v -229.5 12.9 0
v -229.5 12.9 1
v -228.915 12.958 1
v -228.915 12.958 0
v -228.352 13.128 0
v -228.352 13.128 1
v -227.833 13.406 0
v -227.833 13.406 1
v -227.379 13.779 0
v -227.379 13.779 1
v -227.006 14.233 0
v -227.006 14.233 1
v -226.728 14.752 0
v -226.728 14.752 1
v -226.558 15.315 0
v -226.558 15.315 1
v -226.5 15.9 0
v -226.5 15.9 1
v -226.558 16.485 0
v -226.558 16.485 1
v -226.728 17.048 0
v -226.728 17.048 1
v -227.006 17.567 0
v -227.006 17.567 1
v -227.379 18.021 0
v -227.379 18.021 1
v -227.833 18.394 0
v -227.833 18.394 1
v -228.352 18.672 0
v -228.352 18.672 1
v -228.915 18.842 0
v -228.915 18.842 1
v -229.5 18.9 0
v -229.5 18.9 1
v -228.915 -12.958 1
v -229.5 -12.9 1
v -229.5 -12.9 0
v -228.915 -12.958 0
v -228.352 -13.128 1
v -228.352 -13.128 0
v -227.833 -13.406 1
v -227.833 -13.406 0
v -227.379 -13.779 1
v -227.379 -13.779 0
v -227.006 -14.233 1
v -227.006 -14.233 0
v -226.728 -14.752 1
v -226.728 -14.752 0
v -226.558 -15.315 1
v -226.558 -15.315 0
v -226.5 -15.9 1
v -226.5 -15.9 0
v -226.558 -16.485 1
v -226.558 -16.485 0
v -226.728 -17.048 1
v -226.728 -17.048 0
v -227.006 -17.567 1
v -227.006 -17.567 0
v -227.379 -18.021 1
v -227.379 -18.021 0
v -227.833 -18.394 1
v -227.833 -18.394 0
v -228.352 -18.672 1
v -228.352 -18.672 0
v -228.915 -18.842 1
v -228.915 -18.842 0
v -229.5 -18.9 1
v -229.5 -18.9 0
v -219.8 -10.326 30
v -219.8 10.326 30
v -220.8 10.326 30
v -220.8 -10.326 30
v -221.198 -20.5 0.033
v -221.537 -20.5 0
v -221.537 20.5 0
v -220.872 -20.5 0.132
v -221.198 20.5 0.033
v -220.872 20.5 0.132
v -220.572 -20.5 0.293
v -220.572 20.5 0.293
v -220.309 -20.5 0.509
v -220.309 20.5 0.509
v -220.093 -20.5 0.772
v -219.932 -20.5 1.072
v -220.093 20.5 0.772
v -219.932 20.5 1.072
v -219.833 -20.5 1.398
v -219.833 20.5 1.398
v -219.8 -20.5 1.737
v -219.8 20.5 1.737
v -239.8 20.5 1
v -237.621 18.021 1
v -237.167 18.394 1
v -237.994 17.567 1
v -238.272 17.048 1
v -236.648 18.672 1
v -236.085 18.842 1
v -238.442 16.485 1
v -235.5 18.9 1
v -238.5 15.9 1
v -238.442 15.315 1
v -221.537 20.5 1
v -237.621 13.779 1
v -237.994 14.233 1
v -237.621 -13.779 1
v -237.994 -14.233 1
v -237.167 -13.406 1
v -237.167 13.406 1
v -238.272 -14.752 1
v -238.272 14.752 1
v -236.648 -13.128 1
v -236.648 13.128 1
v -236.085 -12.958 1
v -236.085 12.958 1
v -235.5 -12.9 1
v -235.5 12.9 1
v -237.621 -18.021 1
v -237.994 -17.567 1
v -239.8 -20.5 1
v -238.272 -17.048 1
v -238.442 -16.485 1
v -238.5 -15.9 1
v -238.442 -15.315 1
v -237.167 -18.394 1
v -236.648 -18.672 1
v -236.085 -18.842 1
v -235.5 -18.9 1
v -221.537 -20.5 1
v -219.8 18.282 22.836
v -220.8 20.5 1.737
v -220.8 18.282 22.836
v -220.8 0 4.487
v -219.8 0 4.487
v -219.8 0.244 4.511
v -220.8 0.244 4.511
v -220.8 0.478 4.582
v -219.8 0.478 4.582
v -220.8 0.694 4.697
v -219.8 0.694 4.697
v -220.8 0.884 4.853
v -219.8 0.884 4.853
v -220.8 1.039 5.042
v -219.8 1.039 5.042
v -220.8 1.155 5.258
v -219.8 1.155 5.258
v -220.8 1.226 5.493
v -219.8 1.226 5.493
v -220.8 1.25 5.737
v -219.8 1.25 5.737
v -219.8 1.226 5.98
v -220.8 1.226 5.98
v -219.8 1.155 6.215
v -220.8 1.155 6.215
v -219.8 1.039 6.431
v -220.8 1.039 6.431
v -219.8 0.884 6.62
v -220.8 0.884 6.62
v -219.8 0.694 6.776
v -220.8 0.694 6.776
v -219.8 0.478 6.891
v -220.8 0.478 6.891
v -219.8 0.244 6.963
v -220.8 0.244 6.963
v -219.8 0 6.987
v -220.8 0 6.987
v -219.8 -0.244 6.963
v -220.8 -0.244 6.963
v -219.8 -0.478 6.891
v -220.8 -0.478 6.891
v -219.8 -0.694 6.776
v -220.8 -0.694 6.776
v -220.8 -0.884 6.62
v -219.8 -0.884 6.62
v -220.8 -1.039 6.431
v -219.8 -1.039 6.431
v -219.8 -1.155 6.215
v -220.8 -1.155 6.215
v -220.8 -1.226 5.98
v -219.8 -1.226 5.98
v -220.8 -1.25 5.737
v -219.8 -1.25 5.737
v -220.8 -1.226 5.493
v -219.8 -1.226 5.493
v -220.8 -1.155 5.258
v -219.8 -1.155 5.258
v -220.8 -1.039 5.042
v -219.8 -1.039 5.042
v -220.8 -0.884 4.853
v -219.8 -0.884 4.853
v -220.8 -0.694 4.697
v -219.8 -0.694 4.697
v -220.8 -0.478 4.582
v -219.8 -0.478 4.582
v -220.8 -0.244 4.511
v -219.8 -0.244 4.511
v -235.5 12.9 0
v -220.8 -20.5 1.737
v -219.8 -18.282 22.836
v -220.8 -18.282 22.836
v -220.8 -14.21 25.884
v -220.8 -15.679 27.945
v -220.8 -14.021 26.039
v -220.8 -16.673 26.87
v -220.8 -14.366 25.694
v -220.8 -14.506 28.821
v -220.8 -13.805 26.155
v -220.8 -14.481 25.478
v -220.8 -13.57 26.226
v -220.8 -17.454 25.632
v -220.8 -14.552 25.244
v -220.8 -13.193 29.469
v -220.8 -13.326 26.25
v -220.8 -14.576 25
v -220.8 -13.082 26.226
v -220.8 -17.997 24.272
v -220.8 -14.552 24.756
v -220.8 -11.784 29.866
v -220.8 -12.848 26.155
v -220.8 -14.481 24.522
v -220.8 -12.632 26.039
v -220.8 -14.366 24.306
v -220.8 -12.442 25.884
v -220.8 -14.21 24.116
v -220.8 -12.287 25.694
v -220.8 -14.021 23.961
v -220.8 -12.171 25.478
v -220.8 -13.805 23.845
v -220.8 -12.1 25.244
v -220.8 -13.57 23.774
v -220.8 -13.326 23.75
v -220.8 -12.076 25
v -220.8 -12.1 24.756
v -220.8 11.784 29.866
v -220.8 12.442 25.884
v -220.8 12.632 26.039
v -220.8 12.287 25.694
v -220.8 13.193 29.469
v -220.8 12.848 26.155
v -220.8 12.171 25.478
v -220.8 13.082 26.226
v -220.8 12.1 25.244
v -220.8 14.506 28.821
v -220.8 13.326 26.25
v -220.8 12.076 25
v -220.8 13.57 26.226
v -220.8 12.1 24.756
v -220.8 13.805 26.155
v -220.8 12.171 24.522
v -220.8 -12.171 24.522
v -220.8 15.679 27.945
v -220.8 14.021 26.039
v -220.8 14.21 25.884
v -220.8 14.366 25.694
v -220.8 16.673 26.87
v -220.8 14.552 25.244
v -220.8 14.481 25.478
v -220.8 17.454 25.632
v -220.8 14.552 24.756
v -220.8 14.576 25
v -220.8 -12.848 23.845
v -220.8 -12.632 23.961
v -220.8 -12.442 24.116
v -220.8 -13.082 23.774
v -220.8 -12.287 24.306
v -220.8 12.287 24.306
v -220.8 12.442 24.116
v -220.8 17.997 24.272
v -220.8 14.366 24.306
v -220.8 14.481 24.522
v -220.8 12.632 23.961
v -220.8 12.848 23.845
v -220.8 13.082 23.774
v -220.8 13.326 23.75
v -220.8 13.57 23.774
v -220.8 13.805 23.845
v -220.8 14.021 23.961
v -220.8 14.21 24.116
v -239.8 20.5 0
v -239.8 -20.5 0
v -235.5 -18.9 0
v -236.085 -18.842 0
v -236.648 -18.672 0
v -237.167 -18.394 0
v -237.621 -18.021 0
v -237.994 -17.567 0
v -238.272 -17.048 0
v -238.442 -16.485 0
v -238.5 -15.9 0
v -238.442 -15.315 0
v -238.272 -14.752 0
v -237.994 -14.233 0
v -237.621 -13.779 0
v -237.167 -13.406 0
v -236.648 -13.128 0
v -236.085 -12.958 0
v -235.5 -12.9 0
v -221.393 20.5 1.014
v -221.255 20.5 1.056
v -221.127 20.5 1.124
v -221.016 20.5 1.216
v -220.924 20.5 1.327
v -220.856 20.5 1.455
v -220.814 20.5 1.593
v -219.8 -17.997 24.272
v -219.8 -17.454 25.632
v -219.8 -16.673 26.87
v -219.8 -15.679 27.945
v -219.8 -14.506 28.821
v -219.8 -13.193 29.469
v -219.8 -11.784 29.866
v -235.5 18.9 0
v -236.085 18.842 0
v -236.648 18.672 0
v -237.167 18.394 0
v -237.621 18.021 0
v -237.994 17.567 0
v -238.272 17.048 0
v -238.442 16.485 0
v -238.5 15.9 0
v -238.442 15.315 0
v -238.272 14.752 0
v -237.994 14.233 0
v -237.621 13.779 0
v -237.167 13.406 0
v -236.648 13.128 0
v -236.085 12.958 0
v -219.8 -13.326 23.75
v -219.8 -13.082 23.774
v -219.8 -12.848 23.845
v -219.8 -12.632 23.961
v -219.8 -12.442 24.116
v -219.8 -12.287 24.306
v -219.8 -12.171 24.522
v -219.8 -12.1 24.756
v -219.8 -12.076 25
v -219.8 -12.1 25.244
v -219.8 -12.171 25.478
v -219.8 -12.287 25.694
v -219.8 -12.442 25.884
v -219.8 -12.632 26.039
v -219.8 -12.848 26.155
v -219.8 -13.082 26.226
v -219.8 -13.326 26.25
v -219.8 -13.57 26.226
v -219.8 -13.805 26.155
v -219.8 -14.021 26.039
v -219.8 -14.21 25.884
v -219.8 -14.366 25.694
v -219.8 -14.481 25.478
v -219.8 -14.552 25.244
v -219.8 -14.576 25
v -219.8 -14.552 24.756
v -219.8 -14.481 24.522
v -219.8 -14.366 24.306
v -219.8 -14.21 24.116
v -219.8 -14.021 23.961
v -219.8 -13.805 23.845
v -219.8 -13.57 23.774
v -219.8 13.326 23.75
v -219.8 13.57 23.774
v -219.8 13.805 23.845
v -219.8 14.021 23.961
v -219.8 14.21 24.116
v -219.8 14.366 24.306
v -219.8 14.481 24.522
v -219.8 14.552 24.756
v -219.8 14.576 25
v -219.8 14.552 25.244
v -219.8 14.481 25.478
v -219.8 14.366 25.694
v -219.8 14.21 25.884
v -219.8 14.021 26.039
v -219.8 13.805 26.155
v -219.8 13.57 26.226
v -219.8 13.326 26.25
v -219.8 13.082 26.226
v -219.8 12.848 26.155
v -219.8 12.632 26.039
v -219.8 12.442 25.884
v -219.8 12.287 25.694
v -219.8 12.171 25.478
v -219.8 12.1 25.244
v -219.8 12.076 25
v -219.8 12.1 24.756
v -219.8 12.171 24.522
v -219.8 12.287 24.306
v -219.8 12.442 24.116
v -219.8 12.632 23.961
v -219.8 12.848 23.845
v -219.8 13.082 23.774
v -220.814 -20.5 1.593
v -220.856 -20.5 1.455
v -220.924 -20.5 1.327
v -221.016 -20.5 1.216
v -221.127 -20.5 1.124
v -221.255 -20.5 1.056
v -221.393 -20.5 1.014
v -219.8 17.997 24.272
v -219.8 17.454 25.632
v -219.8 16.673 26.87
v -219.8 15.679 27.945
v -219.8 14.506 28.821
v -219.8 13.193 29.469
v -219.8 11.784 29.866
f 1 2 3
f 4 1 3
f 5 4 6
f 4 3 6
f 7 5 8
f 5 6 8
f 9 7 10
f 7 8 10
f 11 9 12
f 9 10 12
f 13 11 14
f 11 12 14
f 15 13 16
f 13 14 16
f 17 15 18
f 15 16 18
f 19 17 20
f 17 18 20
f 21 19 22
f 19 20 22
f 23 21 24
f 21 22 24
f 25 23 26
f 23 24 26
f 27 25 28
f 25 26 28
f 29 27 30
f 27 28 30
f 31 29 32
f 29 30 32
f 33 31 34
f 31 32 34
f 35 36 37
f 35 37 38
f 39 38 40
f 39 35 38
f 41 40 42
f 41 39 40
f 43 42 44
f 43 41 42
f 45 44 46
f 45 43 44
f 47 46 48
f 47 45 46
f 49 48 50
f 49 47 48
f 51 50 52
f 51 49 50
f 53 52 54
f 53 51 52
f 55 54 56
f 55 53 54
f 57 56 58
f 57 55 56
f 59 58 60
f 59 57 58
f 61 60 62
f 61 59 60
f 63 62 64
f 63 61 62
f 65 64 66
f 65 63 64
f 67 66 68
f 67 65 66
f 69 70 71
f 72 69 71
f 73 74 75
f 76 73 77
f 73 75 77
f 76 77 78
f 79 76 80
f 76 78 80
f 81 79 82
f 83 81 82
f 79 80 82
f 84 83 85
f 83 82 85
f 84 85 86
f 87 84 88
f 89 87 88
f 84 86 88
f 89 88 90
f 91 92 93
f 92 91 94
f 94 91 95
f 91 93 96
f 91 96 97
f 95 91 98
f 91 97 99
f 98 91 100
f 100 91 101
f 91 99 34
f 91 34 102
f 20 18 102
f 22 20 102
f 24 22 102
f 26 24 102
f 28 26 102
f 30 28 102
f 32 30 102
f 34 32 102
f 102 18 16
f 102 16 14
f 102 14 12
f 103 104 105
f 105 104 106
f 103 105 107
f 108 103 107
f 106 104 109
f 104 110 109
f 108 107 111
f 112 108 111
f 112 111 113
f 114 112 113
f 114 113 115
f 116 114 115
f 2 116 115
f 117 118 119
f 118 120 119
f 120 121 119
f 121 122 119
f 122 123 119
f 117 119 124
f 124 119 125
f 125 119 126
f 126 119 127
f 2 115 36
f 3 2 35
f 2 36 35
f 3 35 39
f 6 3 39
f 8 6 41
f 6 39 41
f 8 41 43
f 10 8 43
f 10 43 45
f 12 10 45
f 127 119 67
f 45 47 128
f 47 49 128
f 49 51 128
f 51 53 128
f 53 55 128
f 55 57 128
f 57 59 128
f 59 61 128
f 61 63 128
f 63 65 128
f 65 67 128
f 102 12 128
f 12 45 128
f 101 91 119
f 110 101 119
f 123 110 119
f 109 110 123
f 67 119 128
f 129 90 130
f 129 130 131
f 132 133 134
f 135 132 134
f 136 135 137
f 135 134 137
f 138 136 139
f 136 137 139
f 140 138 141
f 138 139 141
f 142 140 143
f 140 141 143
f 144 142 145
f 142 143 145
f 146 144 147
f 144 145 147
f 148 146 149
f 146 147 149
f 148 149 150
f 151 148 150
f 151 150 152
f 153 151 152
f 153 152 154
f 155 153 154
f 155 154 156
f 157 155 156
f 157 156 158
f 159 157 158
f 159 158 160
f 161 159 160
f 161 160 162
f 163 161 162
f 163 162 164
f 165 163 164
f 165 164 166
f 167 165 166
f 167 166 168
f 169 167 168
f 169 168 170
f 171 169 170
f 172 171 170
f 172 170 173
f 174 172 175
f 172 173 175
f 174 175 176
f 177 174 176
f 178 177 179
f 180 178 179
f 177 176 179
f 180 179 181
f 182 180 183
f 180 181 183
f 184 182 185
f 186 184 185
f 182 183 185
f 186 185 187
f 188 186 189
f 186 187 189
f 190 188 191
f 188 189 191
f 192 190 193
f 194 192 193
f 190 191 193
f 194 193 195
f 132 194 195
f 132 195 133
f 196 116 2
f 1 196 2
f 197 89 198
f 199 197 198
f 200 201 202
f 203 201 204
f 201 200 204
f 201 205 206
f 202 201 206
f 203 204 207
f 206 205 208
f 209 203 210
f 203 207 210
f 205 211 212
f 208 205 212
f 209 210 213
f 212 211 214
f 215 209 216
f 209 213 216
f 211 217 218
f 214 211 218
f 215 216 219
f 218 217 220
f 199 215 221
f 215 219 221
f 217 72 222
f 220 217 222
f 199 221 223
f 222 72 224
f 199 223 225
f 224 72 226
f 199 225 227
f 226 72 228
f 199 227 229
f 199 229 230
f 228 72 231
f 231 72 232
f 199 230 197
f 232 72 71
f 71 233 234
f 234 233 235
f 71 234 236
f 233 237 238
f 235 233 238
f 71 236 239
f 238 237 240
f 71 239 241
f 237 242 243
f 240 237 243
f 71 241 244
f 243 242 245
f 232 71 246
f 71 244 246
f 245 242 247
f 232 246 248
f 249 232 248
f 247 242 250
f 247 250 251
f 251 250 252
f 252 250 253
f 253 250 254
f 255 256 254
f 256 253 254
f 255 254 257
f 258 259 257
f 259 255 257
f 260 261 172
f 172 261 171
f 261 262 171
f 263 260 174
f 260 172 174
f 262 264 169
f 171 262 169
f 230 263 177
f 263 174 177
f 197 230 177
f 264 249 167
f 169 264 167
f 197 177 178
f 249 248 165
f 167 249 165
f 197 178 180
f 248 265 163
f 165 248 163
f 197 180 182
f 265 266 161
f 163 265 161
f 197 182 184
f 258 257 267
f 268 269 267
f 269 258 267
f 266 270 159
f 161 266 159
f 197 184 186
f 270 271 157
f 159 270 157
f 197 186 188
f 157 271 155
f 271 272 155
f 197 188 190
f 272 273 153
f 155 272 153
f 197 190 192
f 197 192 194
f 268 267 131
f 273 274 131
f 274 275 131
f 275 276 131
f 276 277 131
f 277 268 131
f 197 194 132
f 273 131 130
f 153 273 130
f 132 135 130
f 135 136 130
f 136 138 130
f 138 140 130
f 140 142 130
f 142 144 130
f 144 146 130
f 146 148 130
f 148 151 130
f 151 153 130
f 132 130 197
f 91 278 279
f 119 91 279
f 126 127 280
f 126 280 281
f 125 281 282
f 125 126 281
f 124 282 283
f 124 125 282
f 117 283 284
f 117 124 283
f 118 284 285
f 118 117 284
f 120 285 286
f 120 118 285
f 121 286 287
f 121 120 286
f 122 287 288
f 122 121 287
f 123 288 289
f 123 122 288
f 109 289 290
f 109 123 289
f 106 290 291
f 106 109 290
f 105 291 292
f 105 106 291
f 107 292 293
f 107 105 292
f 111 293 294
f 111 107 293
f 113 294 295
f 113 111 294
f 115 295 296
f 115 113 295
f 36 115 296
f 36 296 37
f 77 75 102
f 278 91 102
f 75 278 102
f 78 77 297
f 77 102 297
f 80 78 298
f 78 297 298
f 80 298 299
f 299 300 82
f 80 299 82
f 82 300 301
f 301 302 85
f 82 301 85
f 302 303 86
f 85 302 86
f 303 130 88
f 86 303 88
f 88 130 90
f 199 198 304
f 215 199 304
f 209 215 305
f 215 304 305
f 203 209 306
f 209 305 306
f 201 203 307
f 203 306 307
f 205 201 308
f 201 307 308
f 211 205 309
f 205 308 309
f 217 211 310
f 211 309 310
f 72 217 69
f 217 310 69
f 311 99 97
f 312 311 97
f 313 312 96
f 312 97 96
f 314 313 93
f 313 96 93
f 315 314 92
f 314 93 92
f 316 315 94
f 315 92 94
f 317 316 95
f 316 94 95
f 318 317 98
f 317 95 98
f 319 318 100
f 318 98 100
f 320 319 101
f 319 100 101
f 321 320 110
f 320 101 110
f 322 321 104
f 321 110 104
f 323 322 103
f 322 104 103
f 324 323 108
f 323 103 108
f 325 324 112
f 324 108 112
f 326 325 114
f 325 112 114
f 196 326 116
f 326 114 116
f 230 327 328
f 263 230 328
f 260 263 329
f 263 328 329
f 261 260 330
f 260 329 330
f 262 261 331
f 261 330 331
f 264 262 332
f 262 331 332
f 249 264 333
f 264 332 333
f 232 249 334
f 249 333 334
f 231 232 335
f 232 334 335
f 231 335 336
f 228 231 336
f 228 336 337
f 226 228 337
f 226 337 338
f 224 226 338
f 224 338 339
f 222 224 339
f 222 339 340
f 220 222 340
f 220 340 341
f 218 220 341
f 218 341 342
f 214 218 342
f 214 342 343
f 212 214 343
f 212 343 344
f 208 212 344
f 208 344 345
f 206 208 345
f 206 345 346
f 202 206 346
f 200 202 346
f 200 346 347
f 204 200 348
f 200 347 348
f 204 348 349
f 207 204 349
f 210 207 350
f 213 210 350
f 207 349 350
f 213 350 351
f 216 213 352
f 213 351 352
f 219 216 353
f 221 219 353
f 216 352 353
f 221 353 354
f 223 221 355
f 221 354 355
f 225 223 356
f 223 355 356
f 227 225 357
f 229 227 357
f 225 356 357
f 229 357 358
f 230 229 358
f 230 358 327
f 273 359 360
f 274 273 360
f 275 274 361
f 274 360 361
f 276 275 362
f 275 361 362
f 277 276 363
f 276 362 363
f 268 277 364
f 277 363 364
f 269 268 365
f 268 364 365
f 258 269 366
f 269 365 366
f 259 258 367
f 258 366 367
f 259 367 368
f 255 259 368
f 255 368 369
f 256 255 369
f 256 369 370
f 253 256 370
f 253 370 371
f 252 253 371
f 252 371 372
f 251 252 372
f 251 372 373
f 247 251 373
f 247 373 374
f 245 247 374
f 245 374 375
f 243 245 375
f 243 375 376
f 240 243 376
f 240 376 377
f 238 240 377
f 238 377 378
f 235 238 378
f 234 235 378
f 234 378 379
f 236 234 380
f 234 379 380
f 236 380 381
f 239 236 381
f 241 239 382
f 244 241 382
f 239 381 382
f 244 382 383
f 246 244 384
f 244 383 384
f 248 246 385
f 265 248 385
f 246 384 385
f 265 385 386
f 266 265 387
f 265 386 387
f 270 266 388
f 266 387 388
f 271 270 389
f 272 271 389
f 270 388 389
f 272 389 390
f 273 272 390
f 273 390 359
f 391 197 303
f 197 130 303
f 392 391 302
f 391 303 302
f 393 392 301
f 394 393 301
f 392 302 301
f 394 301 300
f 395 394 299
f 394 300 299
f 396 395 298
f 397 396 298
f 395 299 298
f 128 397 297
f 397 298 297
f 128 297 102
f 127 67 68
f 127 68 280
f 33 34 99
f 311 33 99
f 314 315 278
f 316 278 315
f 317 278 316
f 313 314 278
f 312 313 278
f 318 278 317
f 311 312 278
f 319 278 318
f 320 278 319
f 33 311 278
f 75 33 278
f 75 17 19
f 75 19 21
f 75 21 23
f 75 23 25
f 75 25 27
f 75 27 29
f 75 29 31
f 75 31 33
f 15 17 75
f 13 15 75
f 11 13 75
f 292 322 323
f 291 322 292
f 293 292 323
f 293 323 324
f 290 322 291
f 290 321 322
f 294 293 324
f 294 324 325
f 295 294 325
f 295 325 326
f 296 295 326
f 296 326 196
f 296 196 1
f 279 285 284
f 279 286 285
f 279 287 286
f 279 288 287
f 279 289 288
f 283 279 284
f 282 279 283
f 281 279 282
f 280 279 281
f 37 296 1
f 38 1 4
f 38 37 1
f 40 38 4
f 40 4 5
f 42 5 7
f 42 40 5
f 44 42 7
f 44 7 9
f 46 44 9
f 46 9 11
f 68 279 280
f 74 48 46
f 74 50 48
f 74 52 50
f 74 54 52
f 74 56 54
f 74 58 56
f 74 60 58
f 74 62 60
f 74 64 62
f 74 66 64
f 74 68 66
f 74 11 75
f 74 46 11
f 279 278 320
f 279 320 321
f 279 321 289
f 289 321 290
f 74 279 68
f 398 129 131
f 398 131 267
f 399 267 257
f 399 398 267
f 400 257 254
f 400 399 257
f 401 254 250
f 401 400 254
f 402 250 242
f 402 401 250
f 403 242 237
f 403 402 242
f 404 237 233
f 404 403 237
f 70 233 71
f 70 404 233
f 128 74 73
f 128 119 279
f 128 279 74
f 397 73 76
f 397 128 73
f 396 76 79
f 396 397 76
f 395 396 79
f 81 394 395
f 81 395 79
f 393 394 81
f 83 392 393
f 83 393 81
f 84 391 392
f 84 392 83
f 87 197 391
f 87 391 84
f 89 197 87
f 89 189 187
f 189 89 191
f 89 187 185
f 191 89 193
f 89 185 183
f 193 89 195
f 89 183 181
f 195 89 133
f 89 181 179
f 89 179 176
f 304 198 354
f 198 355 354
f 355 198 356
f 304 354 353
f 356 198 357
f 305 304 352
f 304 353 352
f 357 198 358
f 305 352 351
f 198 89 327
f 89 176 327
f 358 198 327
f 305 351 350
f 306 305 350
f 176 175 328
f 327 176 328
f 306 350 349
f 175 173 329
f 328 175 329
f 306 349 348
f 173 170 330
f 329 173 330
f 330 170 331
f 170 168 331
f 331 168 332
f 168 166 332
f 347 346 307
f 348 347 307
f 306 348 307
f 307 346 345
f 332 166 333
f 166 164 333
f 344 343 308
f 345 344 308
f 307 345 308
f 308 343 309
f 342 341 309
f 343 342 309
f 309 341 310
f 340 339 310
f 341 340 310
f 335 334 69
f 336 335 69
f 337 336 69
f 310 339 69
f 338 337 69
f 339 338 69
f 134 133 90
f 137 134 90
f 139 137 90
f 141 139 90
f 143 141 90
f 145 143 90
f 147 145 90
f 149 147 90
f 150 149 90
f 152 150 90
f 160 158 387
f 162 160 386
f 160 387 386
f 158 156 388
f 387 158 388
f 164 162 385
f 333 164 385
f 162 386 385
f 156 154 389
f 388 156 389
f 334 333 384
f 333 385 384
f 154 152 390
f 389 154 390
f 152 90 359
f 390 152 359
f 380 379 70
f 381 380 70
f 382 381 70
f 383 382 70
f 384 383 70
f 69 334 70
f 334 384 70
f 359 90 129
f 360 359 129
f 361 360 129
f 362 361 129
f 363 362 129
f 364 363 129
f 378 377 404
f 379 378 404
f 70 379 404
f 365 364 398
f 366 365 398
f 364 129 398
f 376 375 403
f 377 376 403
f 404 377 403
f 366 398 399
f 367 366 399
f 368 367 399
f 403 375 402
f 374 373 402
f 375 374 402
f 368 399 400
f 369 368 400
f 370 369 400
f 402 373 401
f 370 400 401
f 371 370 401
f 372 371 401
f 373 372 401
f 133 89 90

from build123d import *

# Parameters (mm, degrees)
SKETCH1_W                    = 20
SKETCH1_H                    = 20.5
BASE_FLANGE1_DEPTH           = 1
EDGE_FLANGE1_STRIP_W         = 5.4732
EDGE_FLANGE1_STRIP_H         = 1
EDGE_FLANGE1_STRIP_CUT_DEPTH = 20.5
EDGE_FLANGE1_DEPTH           = 20.5
CUT_EXTRUDE1_DEPTH           = 42.003048667
CUT_EXTRUDE1_DEPTH_BACK      = 10
CUT_EXTRUDE2_DEPTH           = 1
M3_TAPPED_HOLE1_D            = 2.5


# Sheet-metal steps are written as plain solids
with BuildPart() as part:
    # Sketch1 → Base-Flange1 (new body)
    with BuildSketch(Plane.XY):
        with Locations((-229.8, 10.25)):
            Rectangle(SKETCH1_W, SKETCH1_H)
    extrude(amount=BASE_FLANGE1_DEPTH)

    # Edge-Flange1 strip (across the edge) → Edge-Flange1 strip cut (cut)
    with BuildSketch(Plane(origin=(-219.8, 0, 1), x_dir=(-1, 0, 0), z_dir=(0, 1, 0))):
        with Locations((-1, -0.5)):
            Rectangle(EDGE_FLANGE1_STRIP_W, EDGE_FLANGE1_STRIP_H)
    extrude(amount=EDGE_FLANGE1_STRIP_CUT_DEPTH, mode=Mode.SUBTRACT)

    # Edge-Flange1 section (across the edge) → Edge-Flange1 (add)
    with BuildSketch(Plane(origin=(-219.8, 0, 1), x_dir=(-1, 0, 0), z_dir=(0, 1, 0))):
        with BuildLine():
            Line((0, 0.7366), (0, 29))
            Line((0, 29), (1, 29))
            Line((1, 29), (1, 0.7366))
            ThreePointArc((1, 0.7366), (1.215745145, 0.215745145), (1.7366, 0))
            Line((1.7366, 0), (1.7366, -1))
            ThreePointArc((1.7366, -1), (0.508638364, -0.491361636), (0, 0.7366))
        make_face()
    extrude(amount=EDGE_FLANGE1_DEPTH)

    # Sketch9 → Cut-Extrude1 (cut, two sides: drawn at the far end of the back side and taken through both)
    with BuildSketch(Plane.ZY.offset(220.8).offset(-CUT_EXTRUDE1_DEPTH_BACK)):
        with BuildLine():
            Line((-80.481011606, 29.141419193), (1.7366, 20.5))
            Line((1.7366, 20.5), (22.836227706, 18.282339766))
            ThreePointArc((22.836227706, 18.282339766), (27.945158604, 15.679209453), (30, 10.326164603))
            Line((30, 10.326164603), (30, 0))
            Line((30, 0), (30, -82.670489196))
            Line((30, -82.670489196), (147.611596884, 33.541177232))
            Line((147.611596884, 33.541177232), (37.130585278, 145.353085621))
            Line((37.130585278, 145.353085621), (-80.481011606, 29.141419193))
        make_face()
    extrude(amount=CUT_EXTRUDE1_DEPTH + CUT_EXTRUDE1_DEPTH_BACK, mode=Mode.SUBTRACT)

    # Sketch11 → Cut-Extrude2 (cut)
    with BuildSketch(Plane.XY.offset(1)):
        with BuildLine():
            Line((-229.5, 18.9), (-235.5, 18.9))
            ThreePointArc((-235.5, 18.9), (-238.5, 15.9), (-235.5, 12.9))
            Line((-235.5, 12.9), (-229.5, 12.9))
            ThreePointArc((-229.5, 12.9), (-226.5, 15.9), (-229.5, 18.9))
        make_face()
    extrude(amount=-CUT_EXTRUDE2_DEPTH, mode=Mode.SUBTRACT)

    # Mirror1: part across plane


with BuildPart() as part_1:
    add(part.part)
    add(part.part.mirror(Plane(origin=(-239.8, 0, 1), x_dir=(0, 0, 1), z_dir=(0, 1, 0))))

    # M3 Tapped Hole1 (through all)
    with Locations(Plane.ZY.offset(220.8)):
        with Locations((5.7366, 0), (25, 13.326164603), (25, -13.326164603)):
            Hole(M3_TAPPED_HOLE1_D / 2)


solid = part_1.part
